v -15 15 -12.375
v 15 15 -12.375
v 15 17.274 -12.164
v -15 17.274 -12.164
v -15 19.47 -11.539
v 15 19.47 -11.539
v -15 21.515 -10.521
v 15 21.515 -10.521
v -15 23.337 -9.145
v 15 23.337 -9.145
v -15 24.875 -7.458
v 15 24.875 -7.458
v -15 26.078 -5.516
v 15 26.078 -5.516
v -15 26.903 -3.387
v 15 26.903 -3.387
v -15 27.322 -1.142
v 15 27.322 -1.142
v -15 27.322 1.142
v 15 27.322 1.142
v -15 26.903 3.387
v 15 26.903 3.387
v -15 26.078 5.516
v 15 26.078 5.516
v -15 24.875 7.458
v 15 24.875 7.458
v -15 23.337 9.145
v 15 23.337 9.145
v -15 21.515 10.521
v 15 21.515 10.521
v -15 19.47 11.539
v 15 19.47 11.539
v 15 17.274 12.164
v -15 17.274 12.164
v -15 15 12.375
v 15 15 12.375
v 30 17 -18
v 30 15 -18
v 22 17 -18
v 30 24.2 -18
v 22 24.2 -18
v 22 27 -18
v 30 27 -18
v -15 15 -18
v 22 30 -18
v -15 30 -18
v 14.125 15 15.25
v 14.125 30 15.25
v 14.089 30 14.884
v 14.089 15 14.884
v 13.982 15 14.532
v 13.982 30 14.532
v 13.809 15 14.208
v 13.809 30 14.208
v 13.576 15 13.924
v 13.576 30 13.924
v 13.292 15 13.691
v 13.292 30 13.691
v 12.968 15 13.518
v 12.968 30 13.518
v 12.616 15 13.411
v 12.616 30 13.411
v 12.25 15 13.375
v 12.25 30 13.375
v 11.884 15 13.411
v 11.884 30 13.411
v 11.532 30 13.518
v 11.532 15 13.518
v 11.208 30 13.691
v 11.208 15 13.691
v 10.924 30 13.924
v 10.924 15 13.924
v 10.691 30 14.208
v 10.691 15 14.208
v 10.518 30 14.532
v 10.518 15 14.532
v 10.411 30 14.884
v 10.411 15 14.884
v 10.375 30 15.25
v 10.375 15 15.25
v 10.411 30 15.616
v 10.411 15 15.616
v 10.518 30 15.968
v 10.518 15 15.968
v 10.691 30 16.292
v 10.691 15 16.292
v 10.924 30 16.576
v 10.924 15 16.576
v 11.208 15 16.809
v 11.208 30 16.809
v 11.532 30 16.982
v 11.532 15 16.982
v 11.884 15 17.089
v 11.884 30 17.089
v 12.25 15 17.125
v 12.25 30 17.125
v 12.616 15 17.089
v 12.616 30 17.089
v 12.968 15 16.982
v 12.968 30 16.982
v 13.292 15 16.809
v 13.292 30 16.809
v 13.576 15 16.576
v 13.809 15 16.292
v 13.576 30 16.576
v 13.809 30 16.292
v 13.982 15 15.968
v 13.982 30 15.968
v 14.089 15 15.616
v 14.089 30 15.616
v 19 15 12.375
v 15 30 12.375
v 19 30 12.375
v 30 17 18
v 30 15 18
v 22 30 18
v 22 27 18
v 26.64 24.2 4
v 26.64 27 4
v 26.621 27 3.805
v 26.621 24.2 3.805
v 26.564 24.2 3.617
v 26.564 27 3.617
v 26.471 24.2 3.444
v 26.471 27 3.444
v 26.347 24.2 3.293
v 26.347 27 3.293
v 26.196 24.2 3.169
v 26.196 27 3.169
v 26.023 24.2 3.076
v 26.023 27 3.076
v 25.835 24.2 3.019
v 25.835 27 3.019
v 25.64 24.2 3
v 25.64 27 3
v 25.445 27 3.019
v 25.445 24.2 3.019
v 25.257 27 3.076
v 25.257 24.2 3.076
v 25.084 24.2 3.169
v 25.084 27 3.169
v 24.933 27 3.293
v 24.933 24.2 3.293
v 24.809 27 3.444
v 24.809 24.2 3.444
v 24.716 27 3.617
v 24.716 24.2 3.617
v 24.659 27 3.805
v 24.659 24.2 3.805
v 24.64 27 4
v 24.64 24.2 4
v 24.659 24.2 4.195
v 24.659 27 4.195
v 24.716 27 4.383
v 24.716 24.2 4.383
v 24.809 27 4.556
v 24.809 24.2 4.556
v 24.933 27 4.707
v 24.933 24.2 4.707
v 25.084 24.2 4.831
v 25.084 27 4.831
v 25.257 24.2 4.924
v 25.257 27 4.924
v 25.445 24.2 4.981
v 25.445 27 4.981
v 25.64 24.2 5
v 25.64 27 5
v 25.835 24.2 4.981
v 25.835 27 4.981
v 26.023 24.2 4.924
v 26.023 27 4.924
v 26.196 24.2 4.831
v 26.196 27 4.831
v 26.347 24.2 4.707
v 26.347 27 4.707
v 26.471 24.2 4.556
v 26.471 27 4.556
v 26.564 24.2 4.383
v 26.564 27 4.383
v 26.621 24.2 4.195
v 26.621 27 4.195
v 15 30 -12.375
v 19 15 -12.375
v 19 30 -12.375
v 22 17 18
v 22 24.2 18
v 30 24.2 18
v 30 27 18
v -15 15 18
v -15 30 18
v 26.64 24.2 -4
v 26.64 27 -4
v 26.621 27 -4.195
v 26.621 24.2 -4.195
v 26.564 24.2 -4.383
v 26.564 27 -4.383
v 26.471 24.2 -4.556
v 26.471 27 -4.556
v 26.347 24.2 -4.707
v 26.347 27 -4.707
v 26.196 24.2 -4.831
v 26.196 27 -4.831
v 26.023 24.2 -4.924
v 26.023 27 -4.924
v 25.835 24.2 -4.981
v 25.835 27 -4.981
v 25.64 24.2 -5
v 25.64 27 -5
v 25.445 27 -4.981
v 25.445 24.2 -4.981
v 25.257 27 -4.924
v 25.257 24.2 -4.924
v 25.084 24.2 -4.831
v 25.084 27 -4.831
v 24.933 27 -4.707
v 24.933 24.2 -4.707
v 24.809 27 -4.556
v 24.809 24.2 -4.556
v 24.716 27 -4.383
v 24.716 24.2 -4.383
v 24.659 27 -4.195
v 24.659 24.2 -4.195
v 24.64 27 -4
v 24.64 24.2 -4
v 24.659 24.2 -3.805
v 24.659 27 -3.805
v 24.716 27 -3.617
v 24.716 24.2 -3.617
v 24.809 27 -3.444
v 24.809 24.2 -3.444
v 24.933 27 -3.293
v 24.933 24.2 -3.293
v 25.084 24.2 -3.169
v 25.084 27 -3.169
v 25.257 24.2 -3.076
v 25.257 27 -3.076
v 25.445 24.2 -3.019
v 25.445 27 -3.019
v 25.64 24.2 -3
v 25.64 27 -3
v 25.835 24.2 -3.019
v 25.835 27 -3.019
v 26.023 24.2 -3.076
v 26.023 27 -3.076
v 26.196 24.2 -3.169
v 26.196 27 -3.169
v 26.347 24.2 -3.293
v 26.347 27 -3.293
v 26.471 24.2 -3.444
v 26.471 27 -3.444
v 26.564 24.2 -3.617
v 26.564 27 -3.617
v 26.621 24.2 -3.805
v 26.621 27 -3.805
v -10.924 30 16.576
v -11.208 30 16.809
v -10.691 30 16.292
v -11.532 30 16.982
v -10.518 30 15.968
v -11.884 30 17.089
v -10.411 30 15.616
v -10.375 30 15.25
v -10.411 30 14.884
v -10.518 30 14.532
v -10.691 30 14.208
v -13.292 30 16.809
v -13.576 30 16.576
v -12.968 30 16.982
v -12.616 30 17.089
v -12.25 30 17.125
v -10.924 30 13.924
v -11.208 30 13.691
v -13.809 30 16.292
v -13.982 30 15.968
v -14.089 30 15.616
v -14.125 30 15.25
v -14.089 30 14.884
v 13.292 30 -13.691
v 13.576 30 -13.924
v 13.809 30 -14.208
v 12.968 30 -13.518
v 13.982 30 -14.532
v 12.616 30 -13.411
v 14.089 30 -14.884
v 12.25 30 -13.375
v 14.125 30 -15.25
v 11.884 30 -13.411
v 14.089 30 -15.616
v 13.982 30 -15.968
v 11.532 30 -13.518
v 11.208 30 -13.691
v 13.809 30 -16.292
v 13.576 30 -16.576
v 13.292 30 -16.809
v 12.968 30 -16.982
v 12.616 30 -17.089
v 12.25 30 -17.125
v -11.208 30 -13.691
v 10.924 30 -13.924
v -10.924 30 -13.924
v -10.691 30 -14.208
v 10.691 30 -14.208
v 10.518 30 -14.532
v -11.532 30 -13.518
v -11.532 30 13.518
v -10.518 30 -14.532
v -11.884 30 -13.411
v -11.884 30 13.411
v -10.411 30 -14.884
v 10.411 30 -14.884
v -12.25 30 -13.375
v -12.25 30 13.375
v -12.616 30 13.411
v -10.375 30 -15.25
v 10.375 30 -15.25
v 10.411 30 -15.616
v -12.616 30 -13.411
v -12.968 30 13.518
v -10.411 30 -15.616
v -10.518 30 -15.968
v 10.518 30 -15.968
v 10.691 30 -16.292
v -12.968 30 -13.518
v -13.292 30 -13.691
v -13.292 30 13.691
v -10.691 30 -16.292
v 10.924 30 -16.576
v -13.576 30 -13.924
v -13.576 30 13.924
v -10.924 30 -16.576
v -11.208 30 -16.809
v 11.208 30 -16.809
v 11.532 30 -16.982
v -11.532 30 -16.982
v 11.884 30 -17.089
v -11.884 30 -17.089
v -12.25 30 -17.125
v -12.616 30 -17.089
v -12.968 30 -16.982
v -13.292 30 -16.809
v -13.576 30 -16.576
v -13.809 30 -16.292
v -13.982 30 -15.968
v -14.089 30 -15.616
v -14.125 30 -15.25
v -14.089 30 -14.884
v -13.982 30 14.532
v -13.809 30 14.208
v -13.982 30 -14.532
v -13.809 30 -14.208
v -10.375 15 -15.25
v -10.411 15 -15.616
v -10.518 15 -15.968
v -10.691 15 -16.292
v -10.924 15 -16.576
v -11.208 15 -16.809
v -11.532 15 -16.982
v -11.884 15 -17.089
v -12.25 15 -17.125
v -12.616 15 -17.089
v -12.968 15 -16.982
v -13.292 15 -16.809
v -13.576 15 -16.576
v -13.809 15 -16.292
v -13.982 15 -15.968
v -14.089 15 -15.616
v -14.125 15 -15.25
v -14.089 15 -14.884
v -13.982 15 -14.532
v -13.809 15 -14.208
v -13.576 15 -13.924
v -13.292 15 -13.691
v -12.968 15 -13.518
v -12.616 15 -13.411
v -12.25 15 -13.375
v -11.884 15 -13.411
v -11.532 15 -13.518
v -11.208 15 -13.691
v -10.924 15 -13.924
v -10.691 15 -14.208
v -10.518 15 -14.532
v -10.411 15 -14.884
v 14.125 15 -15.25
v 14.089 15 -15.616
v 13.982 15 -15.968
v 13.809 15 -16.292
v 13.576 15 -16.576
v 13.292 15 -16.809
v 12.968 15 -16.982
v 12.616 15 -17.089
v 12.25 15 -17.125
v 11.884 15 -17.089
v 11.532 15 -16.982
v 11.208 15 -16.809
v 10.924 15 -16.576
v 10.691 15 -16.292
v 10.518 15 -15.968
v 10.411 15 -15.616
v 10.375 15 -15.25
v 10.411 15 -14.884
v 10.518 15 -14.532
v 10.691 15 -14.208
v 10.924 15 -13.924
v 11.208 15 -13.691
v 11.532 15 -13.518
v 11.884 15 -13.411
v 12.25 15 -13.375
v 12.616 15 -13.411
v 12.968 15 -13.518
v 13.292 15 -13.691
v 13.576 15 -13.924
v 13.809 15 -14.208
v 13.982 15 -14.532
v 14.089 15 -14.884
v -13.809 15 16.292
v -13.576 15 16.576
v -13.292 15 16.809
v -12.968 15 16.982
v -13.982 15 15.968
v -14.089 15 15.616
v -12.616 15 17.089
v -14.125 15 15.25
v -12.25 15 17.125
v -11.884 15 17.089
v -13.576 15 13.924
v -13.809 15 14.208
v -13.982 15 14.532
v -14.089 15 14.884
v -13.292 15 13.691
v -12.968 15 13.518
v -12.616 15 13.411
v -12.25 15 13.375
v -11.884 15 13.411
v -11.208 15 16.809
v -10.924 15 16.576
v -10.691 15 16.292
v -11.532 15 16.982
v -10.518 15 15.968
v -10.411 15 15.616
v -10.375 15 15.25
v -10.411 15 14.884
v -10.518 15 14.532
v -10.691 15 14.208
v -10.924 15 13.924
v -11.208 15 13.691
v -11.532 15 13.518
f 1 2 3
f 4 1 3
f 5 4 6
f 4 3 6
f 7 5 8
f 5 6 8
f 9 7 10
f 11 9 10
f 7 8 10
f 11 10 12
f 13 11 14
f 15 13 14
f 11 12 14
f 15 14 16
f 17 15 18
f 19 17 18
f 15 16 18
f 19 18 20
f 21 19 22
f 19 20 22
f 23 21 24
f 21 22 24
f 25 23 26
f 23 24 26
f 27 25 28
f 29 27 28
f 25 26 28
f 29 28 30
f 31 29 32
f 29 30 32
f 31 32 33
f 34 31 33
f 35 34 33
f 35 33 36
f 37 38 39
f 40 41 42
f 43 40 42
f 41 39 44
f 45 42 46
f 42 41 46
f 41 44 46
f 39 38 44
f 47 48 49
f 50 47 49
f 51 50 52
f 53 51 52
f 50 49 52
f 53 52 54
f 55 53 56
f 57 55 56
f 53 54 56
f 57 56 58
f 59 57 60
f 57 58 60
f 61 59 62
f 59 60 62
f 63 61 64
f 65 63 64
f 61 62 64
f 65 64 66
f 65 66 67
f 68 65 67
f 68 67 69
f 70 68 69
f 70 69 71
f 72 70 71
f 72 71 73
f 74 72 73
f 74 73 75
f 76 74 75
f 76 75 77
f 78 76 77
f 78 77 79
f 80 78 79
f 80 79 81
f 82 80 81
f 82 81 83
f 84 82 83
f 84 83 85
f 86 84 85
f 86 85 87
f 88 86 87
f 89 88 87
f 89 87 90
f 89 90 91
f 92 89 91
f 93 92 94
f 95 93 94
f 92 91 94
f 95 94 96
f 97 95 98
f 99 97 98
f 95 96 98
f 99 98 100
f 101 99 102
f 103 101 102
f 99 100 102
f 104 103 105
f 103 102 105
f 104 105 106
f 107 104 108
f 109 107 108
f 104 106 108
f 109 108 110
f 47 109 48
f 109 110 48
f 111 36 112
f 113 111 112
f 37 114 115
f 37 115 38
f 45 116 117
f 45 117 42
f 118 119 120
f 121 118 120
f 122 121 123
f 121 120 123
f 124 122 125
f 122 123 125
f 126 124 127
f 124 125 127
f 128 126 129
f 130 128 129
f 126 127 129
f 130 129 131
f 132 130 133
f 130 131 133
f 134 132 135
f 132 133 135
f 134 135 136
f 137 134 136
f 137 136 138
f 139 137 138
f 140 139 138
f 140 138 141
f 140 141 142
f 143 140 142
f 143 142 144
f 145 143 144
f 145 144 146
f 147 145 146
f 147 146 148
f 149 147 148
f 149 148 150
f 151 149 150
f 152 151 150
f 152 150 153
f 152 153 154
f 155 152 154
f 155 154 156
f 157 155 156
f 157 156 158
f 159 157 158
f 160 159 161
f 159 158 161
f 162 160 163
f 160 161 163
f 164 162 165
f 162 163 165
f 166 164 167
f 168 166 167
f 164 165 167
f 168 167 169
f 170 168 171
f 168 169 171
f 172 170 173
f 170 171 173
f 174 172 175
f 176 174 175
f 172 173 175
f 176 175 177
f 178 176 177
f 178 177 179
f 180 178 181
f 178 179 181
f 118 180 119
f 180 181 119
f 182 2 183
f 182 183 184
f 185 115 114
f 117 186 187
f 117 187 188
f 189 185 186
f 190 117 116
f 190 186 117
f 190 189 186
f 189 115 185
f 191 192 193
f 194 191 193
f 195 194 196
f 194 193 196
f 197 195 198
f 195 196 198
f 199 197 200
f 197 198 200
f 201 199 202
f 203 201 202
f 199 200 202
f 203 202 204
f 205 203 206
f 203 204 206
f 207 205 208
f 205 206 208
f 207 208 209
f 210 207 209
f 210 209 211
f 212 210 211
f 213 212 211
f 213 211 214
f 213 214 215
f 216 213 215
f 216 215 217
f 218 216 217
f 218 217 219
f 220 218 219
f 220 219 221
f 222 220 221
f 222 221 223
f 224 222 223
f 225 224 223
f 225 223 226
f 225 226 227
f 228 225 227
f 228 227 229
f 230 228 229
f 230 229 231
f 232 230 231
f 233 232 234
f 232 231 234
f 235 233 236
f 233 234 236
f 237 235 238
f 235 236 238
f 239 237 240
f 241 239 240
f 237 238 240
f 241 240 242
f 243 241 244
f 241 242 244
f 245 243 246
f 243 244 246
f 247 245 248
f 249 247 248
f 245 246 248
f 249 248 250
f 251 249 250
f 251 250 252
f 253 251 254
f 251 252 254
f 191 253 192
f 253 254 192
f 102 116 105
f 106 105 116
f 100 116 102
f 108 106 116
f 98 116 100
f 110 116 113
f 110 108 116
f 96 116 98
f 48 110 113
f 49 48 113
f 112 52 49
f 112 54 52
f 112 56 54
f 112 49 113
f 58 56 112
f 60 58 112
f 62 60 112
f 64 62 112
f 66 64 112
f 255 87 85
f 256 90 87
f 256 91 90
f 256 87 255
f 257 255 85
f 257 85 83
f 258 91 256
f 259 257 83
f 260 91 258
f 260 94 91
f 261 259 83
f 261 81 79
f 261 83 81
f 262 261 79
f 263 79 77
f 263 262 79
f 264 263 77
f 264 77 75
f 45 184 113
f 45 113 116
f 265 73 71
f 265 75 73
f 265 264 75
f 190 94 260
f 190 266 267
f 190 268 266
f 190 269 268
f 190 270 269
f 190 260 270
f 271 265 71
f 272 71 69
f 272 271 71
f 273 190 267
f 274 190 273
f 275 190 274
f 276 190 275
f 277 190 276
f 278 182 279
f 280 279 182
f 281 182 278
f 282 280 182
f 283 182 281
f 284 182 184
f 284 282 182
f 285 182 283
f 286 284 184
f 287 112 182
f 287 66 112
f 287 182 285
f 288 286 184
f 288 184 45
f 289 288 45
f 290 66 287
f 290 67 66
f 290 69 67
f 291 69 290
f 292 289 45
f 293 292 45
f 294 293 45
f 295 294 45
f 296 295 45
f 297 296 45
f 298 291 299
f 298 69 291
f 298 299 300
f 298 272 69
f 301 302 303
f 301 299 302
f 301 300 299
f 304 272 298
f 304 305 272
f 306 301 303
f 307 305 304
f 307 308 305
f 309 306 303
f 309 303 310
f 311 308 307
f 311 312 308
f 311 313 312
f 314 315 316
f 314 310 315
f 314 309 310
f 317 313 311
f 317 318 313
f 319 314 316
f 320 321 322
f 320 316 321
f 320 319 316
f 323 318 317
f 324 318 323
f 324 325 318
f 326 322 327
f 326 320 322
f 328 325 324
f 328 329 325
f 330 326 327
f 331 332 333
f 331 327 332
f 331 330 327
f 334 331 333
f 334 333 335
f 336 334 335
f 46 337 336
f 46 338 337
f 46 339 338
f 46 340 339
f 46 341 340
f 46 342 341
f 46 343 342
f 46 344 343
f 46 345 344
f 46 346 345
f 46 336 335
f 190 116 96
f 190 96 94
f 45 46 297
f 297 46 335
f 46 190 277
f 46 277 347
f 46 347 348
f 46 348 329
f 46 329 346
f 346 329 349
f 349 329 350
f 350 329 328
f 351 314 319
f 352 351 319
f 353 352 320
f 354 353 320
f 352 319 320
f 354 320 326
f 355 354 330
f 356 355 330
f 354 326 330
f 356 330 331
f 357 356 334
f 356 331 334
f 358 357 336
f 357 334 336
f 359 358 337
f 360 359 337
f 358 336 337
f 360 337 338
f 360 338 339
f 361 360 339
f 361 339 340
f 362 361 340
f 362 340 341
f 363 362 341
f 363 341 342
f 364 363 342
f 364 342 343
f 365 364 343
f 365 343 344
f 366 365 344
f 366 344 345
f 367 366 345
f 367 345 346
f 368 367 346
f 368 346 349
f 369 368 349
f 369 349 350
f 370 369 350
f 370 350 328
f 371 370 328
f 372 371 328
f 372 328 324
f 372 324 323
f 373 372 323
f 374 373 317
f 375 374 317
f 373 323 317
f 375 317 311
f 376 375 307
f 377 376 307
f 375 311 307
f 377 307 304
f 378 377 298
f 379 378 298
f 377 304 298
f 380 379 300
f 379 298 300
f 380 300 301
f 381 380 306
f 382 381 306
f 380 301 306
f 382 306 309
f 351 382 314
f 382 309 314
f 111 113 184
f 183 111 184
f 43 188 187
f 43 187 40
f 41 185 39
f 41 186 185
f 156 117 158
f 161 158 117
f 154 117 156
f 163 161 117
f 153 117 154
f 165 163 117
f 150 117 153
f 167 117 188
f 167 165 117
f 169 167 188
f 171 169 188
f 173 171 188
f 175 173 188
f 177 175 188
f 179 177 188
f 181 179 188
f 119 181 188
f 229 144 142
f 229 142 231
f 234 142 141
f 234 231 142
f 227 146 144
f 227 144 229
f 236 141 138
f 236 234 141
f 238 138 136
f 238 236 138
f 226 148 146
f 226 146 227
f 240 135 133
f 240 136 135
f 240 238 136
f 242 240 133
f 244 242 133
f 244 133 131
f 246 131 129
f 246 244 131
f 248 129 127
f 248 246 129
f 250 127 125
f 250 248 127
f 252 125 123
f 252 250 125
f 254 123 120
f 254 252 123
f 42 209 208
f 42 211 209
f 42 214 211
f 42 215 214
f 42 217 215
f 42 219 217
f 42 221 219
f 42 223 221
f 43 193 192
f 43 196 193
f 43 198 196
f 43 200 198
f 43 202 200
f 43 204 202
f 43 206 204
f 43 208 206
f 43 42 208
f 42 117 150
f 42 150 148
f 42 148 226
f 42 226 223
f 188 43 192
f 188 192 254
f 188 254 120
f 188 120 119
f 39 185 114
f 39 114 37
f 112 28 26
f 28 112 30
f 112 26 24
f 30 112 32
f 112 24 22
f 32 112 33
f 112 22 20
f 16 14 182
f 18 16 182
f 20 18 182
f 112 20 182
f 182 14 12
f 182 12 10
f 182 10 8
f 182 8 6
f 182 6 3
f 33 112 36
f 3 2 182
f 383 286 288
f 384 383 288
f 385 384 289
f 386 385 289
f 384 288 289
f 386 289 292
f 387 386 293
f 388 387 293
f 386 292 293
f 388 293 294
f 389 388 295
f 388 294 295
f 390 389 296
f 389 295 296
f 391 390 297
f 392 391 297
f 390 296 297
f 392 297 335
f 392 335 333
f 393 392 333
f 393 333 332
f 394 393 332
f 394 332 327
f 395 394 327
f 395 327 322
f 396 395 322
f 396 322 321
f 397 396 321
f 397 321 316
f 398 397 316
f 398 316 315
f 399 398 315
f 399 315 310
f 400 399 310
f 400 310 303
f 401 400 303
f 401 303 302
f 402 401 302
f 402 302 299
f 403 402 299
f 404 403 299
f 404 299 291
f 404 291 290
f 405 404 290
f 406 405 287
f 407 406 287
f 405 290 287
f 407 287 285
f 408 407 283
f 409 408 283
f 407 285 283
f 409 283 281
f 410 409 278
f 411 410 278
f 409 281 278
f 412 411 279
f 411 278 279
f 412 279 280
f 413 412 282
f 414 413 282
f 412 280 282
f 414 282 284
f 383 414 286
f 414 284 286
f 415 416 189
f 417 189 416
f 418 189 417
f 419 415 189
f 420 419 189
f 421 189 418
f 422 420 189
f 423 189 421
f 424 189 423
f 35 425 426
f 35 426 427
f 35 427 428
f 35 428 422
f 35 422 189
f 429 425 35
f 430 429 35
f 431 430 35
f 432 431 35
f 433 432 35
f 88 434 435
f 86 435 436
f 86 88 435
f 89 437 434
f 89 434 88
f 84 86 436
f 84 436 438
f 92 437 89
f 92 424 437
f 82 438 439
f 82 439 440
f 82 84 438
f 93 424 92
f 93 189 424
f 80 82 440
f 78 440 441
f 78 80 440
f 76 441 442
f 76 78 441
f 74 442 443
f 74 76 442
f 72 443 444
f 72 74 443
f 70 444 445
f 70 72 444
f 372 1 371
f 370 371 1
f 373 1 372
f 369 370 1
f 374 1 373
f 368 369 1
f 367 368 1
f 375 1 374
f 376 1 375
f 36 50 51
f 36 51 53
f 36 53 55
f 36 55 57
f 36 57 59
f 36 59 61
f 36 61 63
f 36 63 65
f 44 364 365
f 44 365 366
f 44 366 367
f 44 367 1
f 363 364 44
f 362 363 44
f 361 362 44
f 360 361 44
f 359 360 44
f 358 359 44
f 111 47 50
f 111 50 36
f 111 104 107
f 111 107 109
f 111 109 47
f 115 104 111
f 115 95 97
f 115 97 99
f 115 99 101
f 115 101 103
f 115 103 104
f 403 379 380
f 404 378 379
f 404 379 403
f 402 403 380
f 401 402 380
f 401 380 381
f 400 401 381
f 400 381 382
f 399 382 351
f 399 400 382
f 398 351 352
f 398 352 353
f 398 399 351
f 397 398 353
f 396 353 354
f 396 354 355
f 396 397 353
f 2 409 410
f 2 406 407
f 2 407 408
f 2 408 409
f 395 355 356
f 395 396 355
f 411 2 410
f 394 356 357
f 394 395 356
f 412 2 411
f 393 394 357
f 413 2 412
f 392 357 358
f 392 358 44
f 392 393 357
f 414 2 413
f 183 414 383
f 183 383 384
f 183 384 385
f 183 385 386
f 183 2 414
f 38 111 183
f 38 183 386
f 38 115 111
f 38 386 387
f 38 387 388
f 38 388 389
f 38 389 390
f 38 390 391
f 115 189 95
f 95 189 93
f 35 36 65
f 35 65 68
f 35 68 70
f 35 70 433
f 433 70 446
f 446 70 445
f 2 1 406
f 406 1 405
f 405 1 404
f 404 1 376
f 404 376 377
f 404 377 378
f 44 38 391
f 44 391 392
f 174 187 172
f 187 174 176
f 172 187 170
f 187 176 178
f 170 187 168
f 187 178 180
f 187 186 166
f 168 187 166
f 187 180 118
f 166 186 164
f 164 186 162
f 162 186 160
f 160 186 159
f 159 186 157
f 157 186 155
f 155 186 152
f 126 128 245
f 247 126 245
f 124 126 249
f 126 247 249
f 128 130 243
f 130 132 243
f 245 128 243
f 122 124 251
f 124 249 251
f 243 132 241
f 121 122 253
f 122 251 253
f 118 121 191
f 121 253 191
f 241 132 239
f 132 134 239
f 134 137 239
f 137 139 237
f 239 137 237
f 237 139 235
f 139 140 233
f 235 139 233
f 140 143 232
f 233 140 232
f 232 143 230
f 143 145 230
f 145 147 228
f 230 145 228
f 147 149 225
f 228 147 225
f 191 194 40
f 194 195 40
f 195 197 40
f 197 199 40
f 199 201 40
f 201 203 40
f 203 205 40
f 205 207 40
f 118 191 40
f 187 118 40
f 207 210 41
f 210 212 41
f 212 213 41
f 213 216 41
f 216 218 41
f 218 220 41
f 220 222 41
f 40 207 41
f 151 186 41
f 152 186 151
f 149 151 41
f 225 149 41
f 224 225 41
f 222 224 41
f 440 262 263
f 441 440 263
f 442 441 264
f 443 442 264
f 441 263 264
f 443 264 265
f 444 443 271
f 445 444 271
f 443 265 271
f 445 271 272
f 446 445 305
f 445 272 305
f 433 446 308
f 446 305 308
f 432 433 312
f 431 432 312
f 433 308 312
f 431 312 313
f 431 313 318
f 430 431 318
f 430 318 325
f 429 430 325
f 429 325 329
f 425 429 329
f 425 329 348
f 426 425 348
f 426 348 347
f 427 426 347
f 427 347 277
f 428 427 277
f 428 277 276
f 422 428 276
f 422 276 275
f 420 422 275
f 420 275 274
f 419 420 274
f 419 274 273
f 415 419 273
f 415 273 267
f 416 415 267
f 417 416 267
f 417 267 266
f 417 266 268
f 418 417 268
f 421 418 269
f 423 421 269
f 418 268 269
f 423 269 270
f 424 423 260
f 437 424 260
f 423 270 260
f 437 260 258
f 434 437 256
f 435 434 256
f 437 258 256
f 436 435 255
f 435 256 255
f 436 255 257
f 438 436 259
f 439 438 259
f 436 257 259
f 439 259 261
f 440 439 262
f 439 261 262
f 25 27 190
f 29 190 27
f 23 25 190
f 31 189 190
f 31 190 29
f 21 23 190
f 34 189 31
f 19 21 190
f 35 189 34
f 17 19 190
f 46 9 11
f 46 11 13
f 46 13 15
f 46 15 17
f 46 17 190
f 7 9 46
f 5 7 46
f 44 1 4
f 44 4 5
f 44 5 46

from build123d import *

# Parameters (mm, degrees)
SKETCH1_W           = 30
SKETCH1_H           = 36
BOSS_EXTRUDE1_DEPTH = 30
SKETCH3_R           = 12.375
CUT_EXTRUDE1_DEPTH  = 40
SKETCH5_R           = 1.875
CUT_EXTRUDE2_DEPTH  = 40
CUT_EXTRUDE3_START  = 15
SKETCH7_W           = 36
SKETCH7_H           = 15
CUT_EXTRUDE3_DEPTH  = 31
SKETCH8_W           = 5.625
SKETCH8_H           = 15
BOSS_EXTRUDE2_DEPTH = 7
SKETCH10_W          = 24.75
SKETCH10_H          = 15
BOSS_EXTRUDE3_DEPTH = 3
SKETCH11_W          = 36
SKETCH11_H          = 5.8
SKETCH11_H_2        = 2
BOSS_EXTRUDE4_DEPTH = 8
SKETCH12_W          = 8
SKETCH12_H          = 36
CUT_EXTRUDE4_DEPTH  = 3
SKETCH13_R          = 1
CUT_EXTRUDE5_DEPTH  = 3


with BuildPart() as part:
    # Sketch1 → Boss-Extrude1 (new body)
    with BuildSketch(Plane(origin=(0, 0, 0), x_dir=(1, 0, 0), z_dir=(0, 1, 0))):
        Rectangle(SKETCH1_W, SKETCH1_H)
    extrude(amount=BOSS_EXTRUDE1_DEPTH)

    # Sketch3 → Cut-Extrude1 (cut)
    with BuildSketch(Plane(origin=(15, 0, 0), x_dir=(0, 0, -1), z_dir=(1, 0, 0))):
        with Locations((0, 15)):
            Circle(SKETCH3_R)
    extrude(amount=-CUT_EXTRUDE1_DEPTH, mode=Mode.SUBTRACT)

    # Sketch5 → Cut-Extrude2 (cut)
    with BuildSketch(Plane(origin=(0, 30, 0), x_dir=(1, 0, 0), z_dir=(0, 1, 0))):
        with Locations((-12.25, 15.25)):
            Circle(SKETCH5_R)
        with Locations((-12.25, -15.25)):
            Circle(SKETCH5_R)
        with Locations((12.25, -15.25)):
            Circle(SKETCH5_R)
        with Locations((12.25, 15.25)):
            Circle(SKETCH5_R)
    extrude(amount=-CUT_EXTRUDE2_DEPTH, mode=Mode.SUBTRACT)

    # Sketch7 → Cut-Extrude3 (cut, through all)
    with BuildSketch(Plane(origin=(0, 0, 0), x_dir=(0, 0, -1), z_dir=(1, 0, 0)).offset(CUT_EXTRUDE3_START)):
        with Locations((0, 7.5)):
            Rectangle(SKETCH7_W, SKETCH7_H)
    extrude(amount=-CUT_EXTRUDE3_DEPTH, mode=Mode.SUBTRACT)

    # Sketch8 → Boss-Extrude2 (add)
    with BuildSketch(Plane(origin=(15, 0, 0), x_dir=(0, 0, -1), z_dir=(1, 0, 0))):
        with Locations((-15.1875, 22.5)):
            Rectangle(SKETCH8_W, SKETCH8_H)
        with Locations((15.1875, 22.5)):
            Rectangle(SKETCH8_W, SKETCH8_H)
    extrude(amount=BOSS_EXTRUDE2_DEPTH)

    # Sketch10 → Boss-Extrude3 (add)
    with BuildSketch(Plane(origin=(22, 0, 0), x_dir=(0, 0, -1), z_dir=(1, 0, 0))):
        with Locations((0, 22.5)):
            Rectangle(SKETCH10_W, SKETCH10_H)
    extrude(amount=-BOSS_EXTRUDE3_DEPTH)

    # Sketch11 → Boss-Extrude4 (add)
    with BuildSketch(Plane(origin=(22, 0, 0), x_dir=(0, 0, -1), z_dir=(1, 0, 0))):
        with Locations((0, 27.1)):
            Rectangle(SKETCH11_W, SKETCH11_H)
        with Locations((0, 16)):
            Rectangle(SKETCH11_W, SKETCH11_H_2)
    extrude(amount=BOSS_EXTRUDE4_DEPTH)

    # Sketch12 → Cut-Extrude4 (cut)
    with BuildSketch(Plane(origin=(0, 30, 0), x_dir=(1, 0, 0), z_dir=(0, 1, 0))):
        with Locations((26, 0)):
            Rectangle(SKETCH12_W, SKETCH12_H)
    extrude(amount=-CUT_EXTRUDE4_DEPTH, mode=Mode.SUBTRACT)

    # Sketch13 → Cut-Extrude5 (cut)
    with BuildSketch(Plane(origin=(0, 27, 0), x_dir=(1, 0, 0), z_dir=(0, 1, 0))):
        with Locations((25.64, 4)):
            Circle(SKETCH13_R)
        with Locations((25.64, -4)):
            Circle(SKETCH13_R)
    extrude(amount=-CUT_EXTRUDE5_DEPTH, mode=Mode.SUBTRACT)


solid = part.part
